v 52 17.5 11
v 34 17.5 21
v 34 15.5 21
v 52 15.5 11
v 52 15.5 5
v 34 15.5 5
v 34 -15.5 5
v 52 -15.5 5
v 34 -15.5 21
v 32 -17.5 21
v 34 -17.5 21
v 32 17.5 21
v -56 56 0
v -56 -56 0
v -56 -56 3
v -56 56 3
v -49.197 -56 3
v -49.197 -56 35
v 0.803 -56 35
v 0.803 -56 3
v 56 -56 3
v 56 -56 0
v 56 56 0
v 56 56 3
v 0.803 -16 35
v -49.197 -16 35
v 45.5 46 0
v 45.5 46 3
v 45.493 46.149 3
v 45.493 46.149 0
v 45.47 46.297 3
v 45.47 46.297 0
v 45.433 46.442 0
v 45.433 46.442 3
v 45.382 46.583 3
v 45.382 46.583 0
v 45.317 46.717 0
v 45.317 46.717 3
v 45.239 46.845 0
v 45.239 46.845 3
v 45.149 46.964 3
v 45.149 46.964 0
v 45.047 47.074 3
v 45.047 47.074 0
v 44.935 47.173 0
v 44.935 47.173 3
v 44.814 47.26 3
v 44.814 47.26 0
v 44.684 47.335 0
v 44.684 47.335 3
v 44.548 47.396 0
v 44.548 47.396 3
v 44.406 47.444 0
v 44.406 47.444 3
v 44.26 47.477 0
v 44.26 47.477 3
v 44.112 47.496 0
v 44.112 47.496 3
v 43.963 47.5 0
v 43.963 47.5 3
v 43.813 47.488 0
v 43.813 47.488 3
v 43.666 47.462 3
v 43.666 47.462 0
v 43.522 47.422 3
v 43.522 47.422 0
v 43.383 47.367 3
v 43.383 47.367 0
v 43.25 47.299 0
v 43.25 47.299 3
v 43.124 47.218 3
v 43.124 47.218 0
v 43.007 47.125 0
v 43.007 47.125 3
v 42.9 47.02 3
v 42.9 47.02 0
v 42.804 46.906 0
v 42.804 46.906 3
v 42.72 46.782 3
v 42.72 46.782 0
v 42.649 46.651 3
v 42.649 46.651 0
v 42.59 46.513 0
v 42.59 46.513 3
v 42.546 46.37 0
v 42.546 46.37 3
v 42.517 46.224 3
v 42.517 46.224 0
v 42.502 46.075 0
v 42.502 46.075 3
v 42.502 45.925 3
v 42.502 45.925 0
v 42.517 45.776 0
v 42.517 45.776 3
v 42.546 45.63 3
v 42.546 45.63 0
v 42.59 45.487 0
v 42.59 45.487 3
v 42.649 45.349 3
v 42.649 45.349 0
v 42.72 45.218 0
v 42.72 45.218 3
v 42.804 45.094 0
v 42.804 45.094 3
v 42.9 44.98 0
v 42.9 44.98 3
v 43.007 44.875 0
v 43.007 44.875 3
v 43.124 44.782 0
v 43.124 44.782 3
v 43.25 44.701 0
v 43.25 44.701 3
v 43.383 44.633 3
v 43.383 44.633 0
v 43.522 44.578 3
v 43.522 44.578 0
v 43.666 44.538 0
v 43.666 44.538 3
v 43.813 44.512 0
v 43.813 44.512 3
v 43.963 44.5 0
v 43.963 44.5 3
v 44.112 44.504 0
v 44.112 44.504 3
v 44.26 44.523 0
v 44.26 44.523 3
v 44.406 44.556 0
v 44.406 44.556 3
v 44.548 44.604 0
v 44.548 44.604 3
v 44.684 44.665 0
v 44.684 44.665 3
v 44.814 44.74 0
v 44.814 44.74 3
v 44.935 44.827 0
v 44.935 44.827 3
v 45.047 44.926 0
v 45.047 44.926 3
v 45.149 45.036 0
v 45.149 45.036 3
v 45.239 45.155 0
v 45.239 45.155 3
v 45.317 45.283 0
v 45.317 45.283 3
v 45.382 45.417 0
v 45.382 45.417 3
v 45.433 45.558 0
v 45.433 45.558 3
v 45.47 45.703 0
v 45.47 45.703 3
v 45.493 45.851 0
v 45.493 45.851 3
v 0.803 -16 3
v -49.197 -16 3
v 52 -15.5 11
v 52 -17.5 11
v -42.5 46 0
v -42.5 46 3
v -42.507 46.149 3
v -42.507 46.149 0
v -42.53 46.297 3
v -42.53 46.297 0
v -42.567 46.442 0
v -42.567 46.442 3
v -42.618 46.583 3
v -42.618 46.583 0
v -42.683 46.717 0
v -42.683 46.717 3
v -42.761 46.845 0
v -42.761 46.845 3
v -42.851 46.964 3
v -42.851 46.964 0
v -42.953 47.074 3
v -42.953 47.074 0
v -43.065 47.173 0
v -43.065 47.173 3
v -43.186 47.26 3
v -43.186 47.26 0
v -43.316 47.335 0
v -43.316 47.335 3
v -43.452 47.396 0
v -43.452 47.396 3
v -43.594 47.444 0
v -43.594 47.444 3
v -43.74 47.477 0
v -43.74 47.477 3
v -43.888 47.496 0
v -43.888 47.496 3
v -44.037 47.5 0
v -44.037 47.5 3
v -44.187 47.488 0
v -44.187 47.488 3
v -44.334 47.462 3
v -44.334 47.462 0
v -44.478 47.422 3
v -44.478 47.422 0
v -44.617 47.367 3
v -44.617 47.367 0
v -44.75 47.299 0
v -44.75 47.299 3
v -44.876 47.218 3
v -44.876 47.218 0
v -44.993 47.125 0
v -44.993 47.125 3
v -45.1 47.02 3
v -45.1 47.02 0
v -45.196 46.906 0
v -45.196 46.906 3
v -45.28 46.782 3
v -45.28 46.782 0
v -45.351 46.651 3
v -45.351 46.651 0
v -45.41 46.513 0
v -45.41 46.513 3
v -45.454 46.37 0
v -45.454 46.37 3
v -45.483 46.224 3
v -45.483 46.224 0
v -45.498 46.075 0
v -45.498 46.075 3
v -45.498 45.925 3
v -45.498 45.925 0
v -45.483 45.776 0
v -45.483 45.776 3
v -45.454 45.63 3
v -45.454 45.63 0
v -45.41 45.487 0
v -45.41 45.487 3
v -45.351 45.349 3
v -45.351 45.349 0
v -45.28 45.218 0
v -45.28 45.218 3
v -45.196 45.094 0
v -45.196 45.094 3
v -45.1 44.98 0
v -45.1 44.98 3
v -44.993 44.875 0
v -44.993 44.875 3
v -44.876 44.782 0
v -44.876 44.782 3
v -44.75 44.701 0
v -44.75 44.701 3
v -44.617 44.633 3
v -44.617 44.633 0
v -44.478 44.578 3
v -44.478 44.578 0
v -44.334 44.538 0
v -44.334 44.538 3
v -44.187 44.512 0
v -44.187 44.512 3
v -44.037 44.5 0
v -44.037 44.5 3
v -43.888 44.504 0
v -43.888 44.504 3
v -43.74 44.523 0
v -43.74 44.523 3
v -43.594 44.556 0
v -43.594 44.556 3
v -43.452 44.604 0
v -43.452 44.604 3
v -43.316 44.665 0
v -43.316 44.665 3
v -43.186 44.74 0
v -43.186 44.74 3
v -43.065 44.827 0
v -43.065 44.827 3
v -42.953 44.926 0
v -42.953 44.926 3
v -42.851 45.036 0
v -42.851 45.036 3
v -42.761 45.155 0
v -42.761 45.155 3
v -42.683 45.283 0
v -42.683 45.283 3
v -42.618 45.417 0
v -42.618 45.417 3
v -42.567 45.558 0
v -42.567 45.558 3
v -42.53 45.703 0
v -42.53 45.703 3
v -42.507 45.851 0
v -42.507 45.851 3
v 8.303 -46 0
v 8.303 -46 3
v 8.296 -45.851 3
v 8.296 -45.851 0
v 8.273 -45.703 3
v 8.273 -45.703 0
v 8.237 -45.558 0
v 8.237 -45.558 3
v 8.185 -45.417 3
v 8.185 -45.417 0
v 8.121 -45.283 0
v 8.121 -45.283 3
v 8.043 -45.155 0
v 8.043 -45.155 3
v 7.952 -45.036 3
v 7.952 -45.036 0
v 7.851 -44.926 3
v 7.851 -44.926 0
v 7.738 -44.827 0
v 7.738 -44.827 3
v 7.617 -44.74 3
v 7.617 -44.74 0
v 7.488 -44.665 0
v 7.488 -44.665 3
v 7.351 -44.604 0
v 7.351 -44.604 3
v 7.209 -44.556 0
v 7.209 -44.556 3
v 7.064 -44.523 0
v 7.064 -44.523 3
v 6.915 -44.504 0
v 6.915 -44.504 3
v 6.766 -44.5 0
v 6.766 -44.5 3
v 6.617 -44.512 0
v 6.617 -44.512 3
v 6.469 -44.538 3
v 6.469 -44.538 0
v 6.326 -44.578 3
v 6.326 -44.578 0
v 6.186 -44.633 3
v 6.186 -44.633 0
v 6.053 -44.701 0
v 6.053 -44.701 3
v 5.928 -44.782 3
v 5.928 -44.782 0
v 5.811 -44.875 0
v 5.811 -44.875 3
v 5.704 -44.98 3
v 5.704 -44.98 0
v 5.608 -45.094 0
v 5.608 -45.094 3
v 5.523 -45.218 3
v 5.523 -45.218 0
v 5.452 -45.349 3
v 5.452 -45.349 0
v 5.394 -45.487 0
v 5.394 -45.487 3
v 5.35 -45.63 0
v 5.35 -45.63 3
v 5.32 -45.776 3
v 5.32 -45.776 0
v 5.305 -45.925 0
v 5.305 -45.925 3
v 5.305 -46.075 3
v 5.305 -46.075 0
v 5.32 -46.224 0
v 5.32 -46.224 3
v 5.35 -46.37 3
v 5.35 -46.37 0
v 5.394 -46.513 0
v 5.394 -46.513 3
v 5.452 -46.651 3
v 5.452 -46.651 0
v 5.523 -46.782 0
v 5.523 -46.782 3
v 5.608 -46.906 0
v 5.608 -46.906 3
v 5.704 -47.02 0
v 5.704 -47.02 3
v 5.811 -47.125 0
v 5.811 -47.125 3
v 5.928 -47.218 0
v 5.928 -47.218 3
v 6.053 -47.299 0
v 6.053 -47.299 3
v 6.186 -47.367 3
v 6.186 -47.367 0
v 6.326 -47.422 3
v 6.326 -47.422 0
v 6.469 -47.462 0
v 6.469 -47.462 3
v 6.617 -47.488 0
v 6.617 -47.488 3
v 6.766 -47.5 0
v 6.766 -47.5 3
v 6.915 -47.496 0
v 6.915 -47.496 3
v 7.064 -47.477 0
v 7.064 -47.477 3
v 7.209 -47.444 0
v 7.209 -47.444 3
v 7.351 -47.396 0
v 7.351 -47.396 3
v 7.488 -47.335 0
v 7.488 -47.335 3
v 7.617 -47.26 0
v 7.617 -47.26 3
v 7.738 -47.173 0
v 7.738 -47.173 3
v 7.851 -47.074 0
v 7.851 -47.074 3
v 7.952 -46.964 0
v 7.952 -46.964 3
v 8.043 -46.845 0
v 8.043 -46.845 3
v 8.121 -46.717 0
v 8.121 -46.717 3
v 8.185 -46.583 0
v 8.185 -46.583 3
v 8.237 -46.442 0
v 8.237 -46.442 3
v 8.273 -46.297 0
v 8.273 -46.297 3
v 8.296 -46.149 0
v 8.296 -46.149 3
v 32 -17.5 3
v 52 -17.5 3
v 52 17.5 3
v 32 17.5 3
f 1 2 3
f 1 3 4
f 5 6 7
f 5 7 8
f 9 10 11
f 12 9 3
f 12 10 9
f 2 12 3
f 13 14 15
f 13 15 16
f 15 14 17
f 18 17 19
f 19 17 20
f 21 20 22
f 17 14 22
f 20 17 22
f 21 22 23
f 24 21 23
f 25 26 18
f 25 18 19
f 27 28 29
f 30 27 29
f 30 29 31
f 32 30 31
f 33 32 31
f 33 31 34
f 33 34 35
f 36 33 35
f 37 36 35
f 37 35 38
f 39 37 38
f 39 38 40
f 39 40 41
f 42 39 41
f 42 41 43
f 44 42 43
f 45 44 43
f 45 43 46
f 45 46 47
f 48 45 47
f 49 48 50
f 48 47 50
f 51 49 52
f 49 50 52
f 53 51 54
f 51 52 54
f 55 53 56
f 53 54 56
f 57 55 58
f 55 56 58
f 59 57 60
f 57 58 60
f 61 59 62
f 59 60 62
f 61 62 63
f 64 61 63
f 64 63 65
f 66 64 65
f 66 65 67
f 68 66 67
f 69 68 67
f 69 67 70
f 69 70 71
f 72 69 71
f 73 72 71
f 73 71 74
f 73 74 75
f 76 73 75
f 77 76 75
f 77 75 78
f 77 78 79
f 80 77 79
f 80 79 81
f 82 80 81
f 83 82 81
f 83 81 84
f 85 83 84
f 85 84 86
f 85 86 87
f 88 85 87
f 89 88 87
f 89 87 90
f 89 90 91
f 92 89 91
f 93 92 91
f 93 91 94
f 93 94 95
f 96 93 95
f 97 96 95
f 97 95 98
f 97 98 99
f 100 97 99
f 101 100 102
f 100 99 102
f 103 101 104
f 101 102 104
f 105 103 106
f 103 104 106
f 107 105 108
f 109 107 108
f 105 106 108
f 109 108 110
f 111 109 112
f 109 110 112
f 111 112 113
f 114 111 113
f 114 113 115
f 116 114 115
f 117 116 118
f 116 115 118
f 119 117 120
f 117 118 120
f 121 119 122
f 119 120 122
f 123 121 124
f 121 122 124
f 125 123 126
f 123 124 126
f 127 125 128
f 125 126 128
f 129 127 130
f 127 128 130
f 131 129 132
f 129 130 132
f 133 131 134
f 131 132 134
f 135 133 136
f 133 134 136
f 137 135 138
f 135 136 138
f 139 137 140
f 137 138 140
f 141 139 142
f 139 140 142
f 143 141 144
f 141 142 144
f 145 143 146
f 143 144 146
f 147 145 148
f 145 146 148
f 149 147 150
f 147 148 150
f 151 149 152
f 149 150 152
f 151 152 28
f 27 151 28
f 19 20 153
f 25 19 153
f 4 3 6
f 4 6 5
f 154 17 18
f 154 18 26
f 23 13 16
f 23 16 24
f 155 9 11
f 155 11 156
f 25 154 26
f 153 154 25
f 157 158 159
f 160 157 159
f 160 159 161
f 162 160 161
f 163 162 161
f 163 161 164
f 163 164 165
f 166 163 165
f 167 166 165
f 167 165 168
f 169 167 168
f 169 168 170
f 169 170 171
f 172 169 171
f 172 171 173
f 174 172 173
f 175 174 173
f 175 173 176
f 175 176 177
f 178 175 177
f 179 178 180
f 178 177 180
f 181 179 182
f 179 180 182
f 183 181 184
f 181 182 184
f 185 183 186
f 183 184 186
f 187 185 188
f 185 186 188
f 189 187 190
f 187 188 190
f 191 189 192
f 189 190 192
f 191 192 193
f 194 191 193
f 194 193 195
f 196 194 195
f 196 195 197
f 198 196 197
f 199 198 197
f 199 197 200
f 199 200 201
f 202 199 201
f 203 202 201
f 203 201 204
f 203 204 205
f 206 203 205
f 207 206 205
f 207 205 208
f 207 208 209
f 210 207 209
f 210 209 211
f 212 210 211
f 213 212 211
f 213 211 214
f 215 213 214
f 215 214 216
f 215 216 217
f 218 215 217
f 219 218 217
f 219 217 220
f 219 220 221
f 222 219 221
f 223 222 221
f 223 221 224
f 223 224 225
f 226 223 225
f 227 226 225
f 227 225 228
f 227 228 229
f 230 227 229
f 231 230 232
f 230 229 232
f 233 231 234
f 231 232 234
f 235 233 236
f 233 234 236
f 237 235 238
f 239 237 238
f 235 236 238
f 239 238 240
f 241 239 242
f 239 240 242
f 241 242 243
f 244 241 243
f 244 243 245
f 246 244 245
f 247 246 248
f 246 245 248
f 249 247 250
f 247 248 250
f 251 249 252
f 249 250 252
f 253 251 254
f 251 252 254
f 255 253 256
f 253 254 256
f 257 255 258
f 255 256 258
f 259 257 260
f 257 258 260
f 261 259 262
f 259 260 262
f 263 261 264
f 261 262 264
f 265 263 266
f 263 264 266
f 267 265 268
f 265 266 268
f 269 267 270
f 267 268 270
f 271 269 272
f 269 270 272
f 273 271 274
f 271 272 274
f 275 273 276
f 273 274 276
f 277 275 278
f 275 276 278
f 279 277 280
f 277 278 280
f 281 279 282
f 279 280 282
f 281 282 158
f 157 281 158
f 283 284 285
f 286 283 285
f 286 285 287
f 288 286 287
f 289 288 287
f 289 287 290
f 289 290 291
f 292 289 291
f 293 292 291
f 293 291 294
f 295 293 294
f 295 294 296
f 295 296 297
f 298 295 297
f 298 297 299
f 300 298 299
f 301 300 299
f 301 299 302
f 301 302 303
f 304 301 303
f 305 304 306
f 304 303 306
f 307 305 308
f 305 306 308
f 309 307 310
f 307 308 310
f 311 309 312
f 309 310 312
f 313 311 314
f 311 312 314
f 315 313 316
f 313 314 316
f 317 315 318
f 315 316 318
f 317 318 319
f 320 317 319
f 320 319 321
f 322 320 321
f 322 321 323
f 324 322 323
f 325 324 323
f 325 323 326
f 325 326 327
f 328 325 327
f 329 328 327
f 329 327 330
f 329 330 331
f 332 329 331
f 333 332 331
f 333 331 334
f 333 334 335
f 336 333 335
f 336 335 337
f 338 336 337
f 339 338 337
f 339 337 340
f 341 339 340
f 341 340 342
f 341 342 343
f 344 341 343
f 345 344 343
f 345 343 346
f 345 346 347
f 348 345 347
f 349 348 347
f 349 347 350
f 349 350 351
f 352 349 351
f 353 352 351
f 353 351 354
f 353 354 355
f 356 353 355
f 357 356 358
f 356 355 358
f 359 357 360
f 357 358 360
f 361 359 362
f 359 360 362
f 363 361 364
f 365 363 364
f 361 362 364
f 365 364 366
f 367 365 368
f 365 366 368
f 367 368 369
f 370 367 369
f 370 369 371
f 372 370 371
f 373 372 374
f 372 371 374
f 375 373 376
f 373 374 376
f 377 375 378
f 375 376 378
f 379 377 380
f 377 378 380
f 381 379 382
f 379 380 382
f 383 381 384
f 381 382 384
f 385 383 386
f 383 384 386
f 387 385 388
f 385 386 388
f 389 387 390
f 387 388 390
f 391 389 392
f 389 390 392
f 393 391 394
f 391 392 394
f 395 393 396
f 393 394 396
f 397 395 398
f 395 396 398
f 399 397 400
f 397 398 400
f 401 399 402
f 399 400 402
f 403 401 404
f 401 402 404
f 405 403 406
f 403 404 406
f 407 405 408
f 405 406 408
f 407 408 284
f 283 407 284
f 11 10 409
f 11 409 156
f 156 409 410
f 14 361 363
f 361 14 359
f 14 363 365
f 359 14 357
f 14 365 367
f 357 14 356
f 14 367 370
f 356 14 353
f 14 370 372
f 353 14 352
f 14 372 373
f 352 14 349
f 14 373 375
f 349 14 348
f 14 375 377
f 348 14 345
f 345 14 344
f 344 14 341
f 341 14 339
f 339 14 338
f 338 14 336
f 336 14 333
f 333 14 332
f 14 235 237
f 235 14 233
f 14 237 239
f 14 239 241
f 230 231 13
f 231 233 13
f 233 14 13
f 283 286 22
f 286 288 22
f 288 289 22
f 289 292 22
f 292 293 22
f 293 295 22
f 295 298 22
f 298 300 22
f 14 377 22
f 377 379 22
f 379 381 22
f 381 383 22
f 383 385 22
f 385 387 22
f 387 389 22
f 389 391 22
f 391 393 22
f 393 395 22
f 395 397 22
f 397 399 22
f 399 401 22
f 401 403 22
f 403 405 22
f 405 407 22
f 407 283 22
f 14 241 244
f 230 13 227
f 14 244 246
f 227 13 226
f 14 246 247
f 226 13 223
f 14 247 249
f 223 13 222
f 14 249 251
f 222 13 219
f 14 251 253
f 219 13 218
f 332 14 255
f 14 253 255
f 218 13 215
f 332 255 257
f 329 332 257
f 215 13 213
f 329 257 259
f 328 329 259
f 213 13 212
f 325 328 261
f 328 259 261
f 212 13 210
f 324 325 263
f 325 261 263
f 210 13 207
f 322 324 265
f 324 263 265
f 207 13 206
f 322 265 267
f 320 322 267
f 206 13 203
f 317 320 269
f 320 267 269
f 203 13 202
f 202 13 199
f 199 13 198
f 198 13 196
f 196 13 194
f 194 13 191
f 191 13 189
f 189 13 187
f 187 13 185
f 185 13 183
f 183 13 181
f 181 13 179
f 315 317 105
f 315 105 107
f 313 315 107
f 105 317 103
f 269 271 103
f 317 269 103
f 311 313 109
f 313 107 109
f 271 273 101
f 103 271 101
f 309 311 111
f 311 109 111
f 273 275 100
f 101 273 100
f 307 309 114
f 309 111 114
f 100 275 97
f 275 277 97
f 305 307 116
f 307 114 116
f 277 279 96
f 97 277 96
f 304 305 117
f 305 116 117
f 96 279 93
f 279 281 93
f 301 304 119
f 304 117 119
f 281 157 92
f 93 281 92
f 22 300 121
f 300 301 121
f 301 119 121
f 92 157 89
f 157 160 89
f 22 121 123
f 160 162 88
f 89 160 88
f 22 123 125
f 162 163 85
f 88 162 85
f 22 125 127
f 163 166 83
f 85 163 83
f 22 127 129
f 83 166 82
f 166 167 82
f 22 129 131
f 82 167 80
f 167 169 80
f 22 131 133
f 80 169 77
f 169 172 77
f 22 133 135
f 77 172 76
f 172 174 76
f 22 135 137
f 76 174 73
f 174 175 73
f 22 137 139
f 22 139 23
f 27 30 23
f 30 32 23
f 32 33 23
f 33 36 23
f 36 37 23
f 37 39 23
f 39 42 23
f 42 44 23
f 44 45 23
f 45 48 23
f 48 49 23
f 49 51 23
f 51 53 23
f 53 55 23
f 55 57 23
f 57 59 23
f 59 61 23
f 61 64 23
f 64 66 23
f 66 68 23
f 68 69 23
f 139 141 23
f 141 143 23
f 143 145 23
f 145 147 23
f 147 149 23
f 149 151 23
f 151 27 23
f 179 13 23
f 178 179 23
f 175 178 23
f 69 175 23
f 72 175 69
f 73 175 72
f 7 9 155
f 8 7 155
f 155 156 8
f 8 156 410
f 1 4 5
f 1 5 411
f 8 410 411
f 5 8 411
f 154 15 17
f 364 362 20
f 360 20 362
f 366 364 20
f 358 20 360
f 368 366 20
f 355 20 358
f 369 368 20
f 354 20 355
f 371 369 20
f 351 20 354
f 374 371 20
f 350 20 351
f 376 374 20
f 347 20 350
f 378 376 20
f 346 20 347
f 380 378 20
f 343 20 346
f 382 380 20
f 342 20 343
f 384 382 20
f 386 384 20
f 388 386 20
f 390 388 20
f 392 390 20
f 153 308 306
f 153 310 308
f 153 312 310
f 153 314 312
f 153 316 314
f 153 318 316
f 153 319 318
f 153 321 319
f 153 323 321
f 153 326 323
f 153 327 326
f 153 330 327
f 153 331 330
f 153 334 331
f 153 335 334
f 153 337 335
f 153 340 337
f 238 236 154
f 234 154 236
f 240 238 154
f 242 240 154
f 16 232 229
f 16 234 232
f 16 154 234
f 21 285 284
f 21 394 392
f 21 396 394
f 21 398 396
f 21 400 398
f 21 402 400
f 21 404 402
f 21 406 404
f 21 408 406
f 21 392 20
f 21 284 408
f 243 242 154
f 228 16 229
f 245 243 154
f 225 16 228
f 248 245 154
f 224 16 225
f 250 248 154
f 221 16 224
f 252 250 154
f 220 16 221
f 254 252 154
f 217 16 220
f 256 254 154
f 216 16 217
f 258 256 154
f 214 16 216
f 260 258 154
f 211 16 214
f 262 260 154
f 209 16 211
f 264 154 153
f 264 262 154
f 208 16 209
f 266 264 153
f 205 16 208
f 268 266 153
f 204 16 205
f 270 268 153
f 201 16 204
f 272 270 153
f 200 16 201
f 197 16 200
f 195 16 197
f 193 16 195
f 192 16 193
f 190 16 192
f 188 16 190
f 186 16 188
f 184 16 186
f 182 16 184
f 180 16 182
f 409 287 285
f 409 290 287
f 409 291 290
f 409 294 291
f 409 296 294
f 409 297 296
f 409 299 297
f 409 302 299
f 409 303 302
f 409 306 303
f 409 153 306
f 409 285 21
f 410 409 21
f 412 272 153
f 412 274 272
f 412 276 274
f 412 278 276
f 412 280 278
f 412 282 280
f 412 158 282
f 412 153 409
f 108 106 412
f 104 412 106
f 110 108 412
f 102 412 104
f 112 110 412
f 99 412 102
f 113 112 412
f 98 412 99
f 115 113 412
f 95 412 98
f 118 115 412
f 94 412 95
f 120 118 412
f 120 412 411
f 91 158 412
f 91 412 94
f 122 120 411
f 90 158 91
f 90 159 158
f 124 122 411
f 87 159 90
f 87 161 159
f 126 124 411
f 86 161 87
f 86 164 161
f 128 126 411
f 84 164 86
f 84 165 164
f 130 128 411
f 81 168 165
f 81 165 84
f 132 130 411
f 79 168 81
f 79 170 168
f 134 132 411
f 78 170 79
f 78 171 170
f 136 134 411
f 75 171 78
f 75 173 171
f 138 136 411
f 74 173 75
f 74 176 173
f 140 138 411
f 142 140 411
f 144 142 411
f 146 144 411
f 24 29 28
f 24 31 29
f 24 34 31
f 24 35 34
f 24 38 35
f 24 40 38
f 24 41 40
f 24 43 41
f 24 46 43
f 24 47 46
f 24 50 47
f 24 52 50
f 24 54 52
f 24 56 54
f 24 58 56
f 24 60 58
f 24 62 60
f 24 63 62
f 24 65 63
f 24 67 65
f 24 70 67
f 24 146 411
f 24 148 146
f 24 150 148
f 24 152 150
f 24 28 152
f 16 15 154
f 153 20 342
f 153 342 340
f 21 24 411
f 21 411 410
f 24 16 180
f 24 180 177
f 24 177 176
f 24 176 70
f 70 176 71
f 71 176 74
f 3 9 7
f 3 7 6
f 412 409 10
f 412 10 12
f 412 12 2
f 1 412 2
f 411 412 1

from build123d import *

# Parameters (mm, degrees)
SKETCH1_W           = 112
SKETCH1_H           = 112
BOSS_EXTRUDE1_DEPTH = 3
SKETCH2_W           = 50
SKETCH2_H           = 40
BOSS_EXTRUDE2_DEPTH = 32
CUT_EXTRUDE1_REACH  = 5
SKETCH3_R           = 1.5
SKETCH4_W           = 20
SKETCH4_H           = 35
BOSS_EXTRUDE3_DEPTH = 18
SKETCH5_W           = 18
SKETCH5_H           = 31
CUT_EXTRUDE2_DEPTH  = 16
CUT_EXTRUDE3_DEPTH  = 74.5


with BuildPart() as part:
    # Sketch1 → Boss-Extrude1 (new body)
    with BuildSketch(Plane.XY):
        Rectangle(SKETCH1_W, SKETCH1_H)
    extrude(amount=BOSS_EXTRUDE1_DEPTH)

    # Sketch2 → Boss-Extrude2 (add)
    with BuildSketch(Plane.XY.offset(3)):
        with Locations((-24.196765027, -36)):
            Rectangle(SKETCH2_W, SKETCH2_H)
    extrude(amount=BOSS_EXTRUDE2_DEPTH)

    # Sketch3 → Cut-Extrude1 (cut, up to next)
    with BuildSketch(Plane.XY.offset(3), mode=Mode.PRIVATE) as cut_extrude1_sk1:
        with Locations((-44, 46)):
            Circle(SKETCH3_R)
    cut_extrude1_tool1 = extrude(cut_extrude1_sk1.sketch, amount=-CUT_EXTRUDE1_REACH, mode=Mode.PRIVATE) & part.part
    add(cut_extrude1_tool1.solids().sort_by_distance((-44, 46, 3))[0], mode=Mode.SUBTRACT)
    # Sketch3 → Cut-Extrude1 (cut, up to next)
    with BuildSketch(Plane.XY.offset(3), mode=Mode.PRIVATE) as cut_extrude1_sk2:
        with Locations((44, 46)):
            Circle(SKETCH3_R)
    cut_extrude1_tool2 = extrude(cut_extrude1_sk2.sketch, amount=-CUT_EXTRUDE1_REACH, mode=Mode.PRIVATE) & part.part
    add(cut_extrude1_tool2.solids().sort_by_distance((44, 46, 3))[0], mode=Mode.SUBTRACT)
    # Sketch3 → Cut-Extrude1 (cut, up to next)
    with BuildSketch(Plane.XY.offset(3), mode=Mode.PRIVATE) as cut_extrude1_sk3:
        with Locations((6.803234973, -46)):
            Circle(SKETCH3_R)
    cut_extrude1_tool3 = extrude(cut_extrude1_sk3.sketch, amount=-CUT_EXTRUDE1_REACH, mode=Mode.PRIVATE) & part.part
    add(cut_extrude1_tool3.solids().sort_by_distance((6.803235, -46, 3))[0], mode=Mode.SUBTRACT)

    # Sketch4 → Boss-Extrude3 (add)
    with BuildSketch(Plane.XY.offset(3)):
        with Locations((42, 0)):
            Rectangle(SKETCH4_W, SKETCH4_H)
    extrude(amount=BOSS_EXTRUDE3_DEPTH)

    # Sketch5 → Cut-Extrude2 (cut)
    with BuildSketch(Plane.XY.offset(21)):
        with Locations((43, 0)):
            Rectangle(SKETCH5_W, SKETCH5_H)
    extrude(amount=-CUT_EXTRUDE2_DEPTH, mode=Mode.SUBTRACT)

    # Sketch6 → Cut-Extrude3 (cut, through all)
    with BuildSketch(Plane(origin=(0, 17.5, 0), x_dir=(1, 0, 0), z_dir=(0, 1, 0))):
        Polygon((34, -21), (52, -11), (52, -21), align=None)
    extrude(amount=-CUT_EXTRUDE3_DEPTH, mode=Mode.SUBTRACT)


solid = part.part
